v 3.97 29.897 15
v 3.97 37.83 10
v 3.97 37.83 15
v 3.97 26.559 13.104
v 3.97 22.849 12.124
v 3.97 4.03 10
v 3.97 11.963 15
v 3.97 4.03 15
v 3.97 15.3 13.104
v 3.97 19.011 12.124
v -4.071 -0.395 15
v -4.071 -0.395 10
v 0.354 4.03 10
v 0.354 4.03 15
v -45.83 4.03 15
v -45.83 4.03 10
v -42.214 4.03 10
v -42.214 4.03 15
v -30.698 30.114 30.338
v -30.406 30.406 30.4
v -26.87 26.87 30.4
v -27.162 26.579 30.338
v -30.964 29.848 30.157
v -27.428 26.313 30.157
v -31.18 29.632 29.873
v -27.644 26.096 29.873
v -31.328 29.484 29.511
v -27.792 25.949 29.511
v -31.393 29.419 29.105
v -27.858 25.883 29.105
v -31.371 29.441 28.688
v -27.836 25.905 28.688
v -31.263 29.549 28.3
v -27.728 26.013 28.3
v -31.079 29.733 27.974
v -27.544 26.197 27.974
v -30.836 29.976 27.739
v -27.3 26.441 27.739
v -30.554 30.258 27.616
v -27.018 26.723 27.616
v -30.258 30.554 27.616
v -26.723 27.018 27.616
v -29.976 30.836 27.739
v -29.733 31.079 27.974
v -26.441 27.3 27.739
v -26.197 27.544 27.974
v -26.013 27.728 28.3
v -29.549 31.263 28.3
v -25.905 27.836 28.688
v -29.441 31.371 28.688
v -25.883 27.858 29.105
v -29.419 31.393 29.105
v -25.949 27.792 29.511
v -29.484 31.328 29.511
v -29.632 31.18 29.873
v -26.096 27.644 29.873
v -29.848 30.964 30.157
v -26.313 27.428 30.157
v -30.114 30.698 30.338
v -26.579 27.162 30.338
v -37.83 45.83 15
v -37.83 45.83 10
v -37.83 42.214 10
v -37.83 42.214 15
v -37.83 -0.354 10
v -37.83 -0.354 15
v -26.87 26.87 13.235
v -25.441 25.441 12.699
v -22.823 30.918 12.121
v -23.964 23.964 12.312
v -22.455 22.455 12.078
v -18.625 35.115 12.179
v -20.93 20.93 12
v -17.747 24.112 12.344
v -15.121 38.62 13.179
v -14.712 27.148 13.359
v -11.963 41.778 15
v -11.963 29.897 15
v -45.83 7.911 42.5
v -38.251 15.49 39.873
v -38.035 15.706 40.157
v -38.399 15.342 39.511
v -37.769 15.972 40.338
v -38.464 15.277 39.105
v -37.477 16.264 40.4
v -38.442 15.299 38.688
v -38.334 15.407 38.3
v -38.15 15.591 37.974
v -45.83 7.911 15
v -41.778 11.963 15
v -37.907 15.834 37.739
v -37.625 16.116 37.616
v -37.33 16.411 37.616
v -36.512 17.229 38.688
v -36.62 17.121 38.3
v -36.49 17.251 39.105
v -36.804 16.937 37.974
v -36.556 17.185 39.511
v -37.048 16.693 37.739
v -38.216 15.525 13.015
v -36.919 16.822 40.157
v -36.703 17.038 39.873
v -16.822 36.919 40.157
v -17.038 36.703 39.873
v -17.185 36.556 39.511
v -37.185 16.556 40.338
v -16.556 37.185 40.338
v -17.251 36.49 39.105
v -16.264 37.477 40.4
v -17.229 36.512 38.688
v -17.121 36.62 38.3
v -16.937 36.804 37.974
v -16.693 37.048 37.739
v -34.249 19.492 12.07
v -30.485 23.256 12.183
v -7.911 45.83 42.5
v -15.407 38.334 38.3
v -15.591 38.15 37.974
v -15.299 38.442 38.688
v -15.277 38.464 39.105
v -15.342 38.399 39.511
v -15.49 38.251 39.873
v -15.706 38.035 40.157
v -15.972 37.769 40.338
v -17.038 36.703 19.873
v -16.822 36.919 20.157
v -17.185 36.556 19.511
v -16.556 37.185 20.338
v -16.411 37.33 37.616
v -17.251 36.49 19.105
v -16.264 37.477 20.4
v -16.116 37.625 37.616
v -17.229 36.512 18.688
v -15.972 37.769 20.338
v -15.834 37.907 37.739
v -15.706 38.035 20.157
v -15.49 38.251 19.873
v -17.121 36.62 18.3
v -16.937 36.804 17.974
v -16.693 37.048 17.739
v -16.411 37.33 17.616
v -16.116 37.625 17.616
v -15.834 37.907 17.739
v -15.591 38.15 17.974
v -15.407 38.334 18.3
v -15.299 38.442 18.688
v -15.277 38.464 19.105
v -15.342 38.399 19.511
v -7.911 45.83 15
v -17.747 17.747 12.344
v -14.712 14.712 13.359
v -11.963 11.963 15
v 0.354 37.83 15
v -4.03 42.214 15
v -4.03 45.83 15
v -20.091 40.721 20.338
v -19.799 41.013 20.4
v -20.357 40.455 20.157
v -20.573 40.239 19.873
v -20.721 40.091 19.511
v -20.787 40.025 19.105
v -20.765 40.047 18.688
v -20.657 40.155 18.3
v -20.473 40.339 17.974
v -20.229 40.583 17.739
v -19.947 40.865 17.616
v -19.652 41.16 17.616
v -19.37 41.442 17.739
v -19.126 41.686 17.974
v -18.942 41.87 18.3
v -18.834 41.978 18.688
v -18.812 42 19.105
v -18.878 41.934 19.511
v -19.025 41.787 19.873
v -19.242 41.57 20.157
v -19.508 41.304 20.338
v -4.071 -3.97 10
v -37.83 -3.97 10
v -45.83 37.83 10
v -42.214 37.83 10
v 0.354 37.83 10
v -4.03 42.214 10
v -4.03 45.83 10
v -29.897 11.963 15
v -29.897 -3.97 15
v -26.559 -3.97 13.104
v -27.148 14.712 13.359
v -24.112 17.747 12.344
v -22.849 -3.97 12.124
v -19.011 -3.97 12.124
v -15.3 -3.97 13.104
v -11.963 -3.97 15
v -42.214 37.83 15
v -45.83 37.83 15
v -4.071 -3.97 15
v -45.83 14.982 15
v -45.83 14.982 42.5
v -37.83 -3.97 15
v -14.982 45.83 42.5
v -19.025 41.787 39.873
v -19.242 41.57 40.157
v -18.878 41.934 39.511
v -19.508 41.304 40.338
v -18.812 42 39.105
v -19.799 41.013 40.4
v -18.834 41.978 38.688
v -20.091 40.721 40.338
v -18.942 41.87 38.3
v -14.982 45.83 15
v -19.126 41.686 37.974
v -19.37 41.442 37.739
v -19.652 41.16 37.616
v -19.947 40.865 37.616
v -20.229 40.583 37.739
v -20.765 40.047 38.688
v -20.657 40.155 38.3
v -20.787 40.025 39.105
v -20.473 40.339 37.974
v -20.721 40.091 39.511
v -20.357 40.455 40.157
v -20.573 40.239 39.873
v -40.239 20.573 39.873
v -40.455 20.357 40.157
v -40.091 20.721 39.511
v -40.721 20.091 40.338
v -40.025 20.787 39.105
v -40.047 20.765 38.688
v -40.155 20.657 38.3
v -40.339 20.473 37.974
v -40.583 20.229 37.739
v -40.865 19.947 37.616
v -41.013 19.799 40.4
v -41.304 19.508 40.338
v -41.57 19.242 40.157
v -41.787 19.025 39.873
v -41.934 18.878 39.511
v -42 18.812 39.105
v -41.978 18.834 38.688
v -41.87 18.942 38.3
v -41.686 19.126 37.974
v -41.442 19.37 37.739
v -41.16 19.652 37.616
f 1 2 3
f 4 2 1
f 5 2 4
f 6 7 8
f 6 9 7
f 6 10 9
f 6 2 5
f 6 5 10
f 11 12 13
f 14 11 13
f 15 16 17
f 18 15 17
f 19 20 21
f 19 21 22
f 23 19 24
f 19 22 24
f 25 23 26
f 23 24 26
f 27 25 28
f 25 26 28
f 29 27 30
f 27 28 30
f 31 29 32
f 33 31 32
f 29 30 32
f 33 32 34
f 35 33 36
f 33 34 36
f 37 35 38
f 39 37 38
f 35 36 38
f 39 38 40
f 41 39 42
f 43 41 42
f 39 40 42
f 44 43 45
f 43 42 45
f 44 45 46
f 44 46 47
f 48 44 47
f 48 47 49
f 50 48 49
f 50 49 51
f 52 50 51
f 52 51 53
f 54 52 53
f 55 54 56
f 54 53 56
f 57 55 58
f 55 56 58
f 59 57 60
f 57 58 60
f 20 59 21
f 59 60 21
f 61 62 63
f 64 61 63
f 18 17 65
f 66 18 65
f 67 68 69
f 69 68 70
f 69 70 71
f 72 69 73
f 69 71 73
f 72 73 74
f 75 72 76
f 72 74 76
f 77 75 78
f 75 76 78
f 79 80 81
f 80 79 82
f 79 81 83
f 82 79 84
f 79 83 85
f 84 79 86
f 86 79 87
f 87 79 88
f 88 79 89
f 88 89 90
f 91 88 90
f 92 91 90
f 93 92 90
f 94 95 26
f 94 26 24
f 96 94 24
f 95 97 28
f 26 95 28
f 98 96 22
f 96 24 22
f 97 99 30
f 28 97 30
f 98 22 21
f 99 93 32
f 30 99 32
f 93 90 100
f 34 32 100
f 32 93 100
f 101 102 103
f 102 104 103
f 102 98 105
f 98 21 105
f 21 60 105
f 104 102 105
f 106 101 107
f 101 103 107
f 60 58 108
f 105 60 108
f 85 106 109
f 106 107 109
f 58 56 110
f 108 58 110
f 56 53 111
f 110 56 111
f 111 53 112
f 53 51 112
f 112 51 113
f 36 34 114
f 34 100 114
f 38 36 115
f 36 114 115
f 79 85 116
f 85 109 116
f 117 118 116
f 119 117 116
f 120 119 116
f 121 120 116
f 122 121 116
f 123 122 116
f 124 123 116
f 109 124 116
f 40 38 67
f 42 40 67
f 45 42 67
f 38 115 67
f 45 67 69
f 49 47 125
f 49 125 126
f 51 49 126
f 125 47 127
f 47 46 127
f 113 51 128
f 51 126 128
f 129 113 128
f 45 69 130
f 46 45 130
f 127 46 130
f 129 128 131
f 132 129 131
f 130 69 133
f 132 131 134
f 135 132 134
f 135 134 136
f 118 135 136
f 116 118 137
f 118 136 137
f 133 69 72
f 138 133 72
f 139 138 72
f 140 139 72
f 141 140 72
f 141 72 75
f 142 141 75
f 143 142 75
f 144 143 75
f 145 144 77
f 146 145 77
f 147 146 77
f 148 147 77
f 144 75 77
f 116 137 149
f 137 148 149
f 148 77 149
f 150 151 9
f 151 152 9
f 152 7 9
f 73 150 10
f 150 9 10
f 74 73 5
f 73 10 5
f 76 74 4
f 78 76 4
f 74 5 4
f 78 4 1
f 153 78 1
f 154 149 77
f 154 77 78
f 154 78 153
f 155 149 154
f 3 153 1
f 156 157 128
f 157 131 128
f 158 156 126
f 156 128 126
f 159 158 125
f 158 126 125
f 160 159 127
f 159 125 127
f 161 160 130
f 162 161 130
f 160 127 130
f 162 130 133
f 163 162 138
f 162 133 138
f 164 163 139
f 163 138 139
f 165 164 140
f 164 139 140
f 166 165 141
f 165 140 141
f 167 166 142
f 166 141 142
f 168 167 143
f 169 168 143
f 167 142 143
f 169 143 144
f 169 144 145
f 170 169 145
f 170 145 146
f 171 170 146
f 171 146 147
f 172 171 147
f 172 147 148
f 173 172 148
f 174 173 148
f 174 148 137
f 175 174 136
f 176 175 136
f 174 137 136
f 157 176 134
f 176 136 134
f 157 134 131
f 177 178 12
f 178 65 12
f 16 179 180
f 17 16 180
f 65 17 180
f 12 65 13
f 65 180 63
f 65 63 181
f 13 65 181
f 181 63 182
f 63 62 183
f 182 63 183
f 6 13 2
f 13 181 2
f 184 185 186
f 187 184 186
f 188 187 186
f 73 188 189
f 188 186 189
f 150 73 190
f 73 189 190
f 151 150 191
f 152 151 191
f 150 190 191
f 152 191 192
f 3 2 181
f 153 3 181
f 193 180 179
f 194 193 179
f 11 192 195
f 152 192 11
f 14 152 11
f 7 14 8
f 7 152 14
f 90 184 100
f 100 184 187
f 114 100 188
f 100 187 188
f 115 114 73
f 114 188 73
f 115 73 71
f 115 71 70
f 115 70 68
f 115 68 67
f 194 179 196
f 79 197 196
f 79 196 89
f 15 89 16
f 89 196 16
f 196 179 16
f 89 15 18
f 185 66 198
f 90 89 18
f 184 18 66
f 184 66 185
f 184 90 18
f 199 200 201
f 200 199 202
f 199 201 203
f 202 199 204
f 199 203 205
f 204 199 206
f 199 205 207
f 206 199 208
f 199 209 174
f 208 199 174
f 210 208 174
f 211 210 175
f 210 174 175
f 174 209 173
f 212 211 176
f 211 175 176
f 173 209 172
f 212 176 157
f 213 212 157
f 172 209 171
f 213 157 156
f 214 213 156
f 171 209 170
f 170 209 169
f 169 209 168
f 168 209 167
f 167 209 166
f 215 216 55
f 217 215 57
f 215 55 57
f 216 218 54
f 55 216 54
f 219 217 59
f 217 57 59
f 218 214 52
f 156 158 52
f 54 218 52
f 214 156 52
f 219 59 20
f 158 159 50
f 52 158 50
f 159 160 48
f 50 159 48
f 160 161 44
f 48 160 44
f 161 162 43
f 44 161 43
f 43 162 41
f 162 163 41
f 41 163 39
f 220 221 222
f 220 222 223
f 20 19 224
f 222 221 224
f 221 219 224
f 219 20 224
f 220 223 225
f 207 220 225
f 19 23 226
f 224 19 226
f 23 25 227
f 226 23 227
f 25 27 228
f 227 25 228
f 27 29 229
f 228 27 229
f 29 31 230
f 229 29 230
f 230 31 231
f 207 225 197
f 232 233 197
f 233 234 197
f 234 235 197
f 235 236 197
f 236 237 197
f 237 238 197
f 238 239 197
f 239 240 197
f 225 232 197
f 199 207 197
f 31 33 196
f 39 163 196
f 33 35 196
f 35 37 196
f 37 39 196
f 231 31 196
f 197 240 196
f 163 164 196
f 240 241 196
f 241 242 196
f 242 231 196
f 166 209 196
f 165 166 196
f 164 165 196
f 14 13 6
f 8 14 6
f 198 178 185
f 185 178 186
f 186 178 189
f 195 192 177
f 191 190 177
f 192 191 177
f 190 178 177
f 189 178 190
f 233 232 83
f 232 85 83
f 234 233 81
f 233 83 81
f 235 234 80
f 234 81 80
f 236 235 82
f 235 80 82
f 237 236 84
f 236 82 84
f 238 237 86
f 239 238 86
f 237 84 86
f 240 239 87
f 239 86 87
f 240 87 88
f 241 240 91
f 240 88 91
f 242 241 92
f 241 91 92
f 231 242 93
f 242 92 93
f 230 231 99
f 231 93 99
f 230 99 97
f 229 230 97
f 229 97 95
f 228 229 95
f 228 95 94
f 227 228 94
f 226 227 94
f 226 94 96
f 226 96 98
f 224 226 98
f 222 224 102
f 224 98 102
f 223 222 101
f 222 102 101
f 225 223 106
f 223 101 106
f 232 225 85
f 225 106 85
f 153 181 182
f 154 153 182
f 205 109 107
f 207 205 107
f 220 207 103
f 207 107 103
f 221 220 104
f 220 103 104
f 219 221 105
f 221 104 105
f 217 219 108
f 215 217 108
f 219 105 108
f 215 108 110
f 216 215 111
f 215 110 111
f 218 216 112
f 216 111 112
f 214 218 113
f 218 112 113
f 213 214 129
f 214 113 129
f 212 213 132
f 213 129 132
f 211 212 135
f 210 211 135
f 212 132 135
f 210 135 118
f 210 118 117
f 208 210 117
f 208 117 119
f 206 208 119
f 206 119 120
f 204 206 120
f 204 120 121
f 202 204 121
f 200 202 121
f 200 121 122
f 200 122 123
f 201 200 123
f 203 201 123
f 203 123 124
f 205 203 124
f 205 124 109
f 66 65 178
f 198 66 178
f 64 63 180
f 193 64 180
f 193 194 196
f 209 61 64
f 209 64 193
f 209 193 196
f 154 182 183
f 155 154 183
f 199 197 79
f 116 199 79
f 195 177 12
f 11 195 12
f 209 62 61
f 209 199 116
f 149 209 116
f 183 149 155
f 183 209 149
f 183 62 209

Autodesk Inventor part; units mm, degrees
ref_plane "Work Plane1" through (0, 0, 10) normal (0, 0, 1) x (1, 0, 0)
sketch "Sketch1" plane through (0, 0, 10) normal (0, 0, 1) x (1, 0, 0)
  line L0 (-4.0299, -0.3538) -> (-2.2322, 1.4439) construction
  arc A0 (-1.4439, 2.2322) -> (-2.2322, 1.4439) centre (-0.9299, 0.9299) ccw construction
  line L1 (-1.4439, 2.2322) -> (0.3538, 4.0299) construction
  line L2 (-37.8299, 42.8299) -> (-37.8299, 37.8299) construction
  line L3 (-37.8299, 37.8299) -> (-42.9208, 37.8299) construction
  line L4 (-37.8299, 42.2137) -> (-37.8299, 45.8299) construction
  line L5 (-37.8299, 45.8299) -> (-4.0299, 45.8299) construction
  line L6 (-4.0299, 45.8299) -> (-4.0299, 42.2137) construction
  line L7 (-4.0299, 4.0299) -> (0.3538, 4.0299) projected
  circle A1 centre (-20.9299, 20.9299) radius 17.5 projected
  line L8 (-20.9299, 58.9723) -> (17.1124, 20.9299) construction
  line L9 (17.1124, 20.9299) -> (-20.9299, -17.1124) construction
  line L10 (-20.9299, -17.1124) -> (-58.9723, 20.9299) construction
  line L11 (-58.9723, 20.9299) -> (-20.9299, 58.9723) construction
  line L12 (-20.9299, 58.9723) -> (-20.9299, -17.1124) construction
  line L13 (17.1124, 20.9299) -> (-58.9723, 20.9299) construction
  line L14 (-20.9299, 58.9723) -> (32.8701, 58.9723) construction
  line L15 (-43.4299, 43.4299) -> (1.5701, 43.4299) construction
  line L16 (1.5701, 43.4299) -> (1.5701, -1.5701) construction
  line L17 (1.5701, -1.5701) -> (-43.4299, -1.5701) construction
  line L18 (-43.4299, -1.5701) -> (-43.4299, 43.4299) construction
  line L19 (-43.4299, 43.4299) -> (1.5701, -1.5701) construction
  line L20 (1.5701, 43.4299) -> (-43.4299, -1.5701) construction
  line L21 (-43.4299, 5.3876) -> (-43.4299, 36.4723)
  line L22 (-43.4299, 36.4723) -> (-36.4723, 43.4299)
  line L23 (-36.4723, 43.4299) -> (-5.3876, 43.4299)
  line L24 (-5.3876, 43.4299) -> (1.5701, 36.4723)
  line L25 (1.5701, 36.4723) -> (1.5701, 5.3876)
  line L26 (1.5701, 5.3876) -> (-5.3876, -1.5701)
  line L27 (-5.3876, -1.5701) -> (-36.4723, -1.5701)
  line L28 (-36.4723, -1.5701) -> (-43.4299, 5.3876)
  line L29 (-4.0299, 42.2137) -> (-37.8299, 42.2137) projected
  line L30 (-4.0299, -0.3538) -> (-4.0299, 4.0299) projected
  circle A2 centre (-20.9299, 20.9299) radius 1.4
  line L31 (-10.9299, 10.9299) -> (-30.9299, 10.9299) construction
  line L32 (-30.9299, 10.9299) -> (-30.9299, 30.9299) construction
  line L33 (-30.9299, 30.9299) -> (-10.9299, 30.9299) construction
  line L34 (-10.9299, 30.9299) -> (-10.9299, 10.9299) construction
  line L35 (-10.9299, 10.9299) -> (-30.9299, 30.9299) construction
  line L36 (-30.9299, 10.9299) -> (-10.9299, 30.9299) construction
  circle A3 centre (-30.9299, 30.9299) radius 1.4
  circle A4 centre (-30.9299, 10.9299) radius 1.4
  circle A5 centre (-10.9299, 10.9299) radius 1.4
  line L37 (-45.8299, 37.8299) -> (-42.0723, 37.8299) construction
  line L38 (-42.1723, 37.7299) -> (-45.8299, 37.7299)
  line L39 (-45.8299, 37.7299) -> (-45.8299, 4.1299)
  line L40 (-45.8299, 4.1299) -> (-42.1723, 4.1299)
  line L41 (-42.1723, 4.1299) -> (-42.1723, 37.7299)
  line L42 (-45.8299, 4.0299) -> (-42.0723, 4.0299) construction
  line L43 (-45.8299, 37.8299) -> (-42.0723, 37.8299) projected
  line L44 (-37.7299, 45.8299) -> (-4.1299, 45.8299)
  line L45 (-4.1299, 45.8299) -> (-4.1299, 42.1723)
  line L46 (-4.1299, 42.1723) -> (-37.7299, 42.1723)
  line L47 (-37.7299, 42.1723) -> (-37.7299, 45.8299)
  line L48 (0.4701, 37.8299) -> (0.4701, 4.0299) construction
  line L49 (0.4701, 4.0299) -> (3.9701, 4.0299) construction
  line L50 (3.9701, 37.8299) -> (3.9701, 4.0299) construction
  line L51 (0.4701, 37.8299) -> (3.9701, 37.8299) construction
  line L52 (-45.8299, -3.9701) -> (-4.0299, -3.9701) construction
  line L53 (0.3124, 37.7299) -> (3.9701, 37.7299)
  line L54 (3.9701, 37.7299) -> (3.9701, 4.1299)
  line L55 (3.9701, 4.1299) -> (0.3124, 4.1299)
  line L56 (0.3124, 4.1299) -> (0.3124, 37.7299)
  line L57 (-4.1713, -0.3538) -> (-37.7299, -0.3538)
  line L58 (-37.7299, -0.3538) -> (-37.7299, -3.9701)
  line L59 (-37.7299, -3.9701) -> (-4.1713, -3.9701)
  line L60 (-4.1713, -3.9701) -> (-4.1713, -0.3538)
  point P0 (-37.8299, 4.0299)
  dimension "d18" = 53.8
  dimension "d19" = 45
  dimension "d20" = 53.8
  dimension "d21" = 45
  dimension "d22" = 45
  dimension "d30" = 20
  dimension "d31" = 20
  dimension "d32" = 2.8
  dimension "d33" = 2.8
  dimension "d34" = 2.8
  dimension "d35" = 2.8
  dimension "d36" = 0.1
  dimension "d37" = 0.1
  dimension "d38" = 0.1
  dimension "d39" = 0.1
extrude "Extrusion1" add sketch "Sketch1" along normal blind 5 contours L30 L26 L57 L28 L41 L22 L46 L24 L56 L7 | L7 L26 L30 | L56 L24 L25 L26 | L26 L25 L24 L53 L54 L55 | L60 L59 L58 L57 L28 L27 L26 | L26 L27 L28 L57 | L46 L22 L29 L24 | L24 L29 L45 | L40 L39 L38 L22 L21 L28 | L28 L21 L22 L41 | L29 L22 L23 L24 | L24 L23 L22 L29 L47 L44 L45 | L47 L29 L22 | A1 | A2 | A3 | A4 | A5
sketch "Sketch4" plane through (0, 0, 15) normal (0, 0, 1) x (1, 0, 0)
  line L0 (-37.7299, 42.1723) -> (-42.1723, 37.7299) projected
  line L1 (-42.1723, 37.7299) -> (-45.8299, 37.7299) projected
  line L2 (-45.8299, 37.7299) -> (-45.8299, 4.1299) projected
  line L3 (-45.8299, 4.1299) -> (-42.1723, 4.1299) projected
  line L4 (-42.1723, 4.1299) -> (-37.6885, -0.3538) projected
  line L5 (-37.6885, -0.3538) -> (-37.7299, -0.3538) projected
  line L6 (-37.7299, -0.3538) -> (-37.7299, -3.9701) projected
  line L7 (-37.7299, -3.9701) -> (-4.1713, -3.9701) projected
  line L8 (-4.1713, -3.9701) -> (-4.1713, -0.3538) projected
  line L9 (-4.1713, -0.3538) -> (0.3124, 4.1299) projected
  line L10 (0.3124, 4.1299) -> (3.9701, 4.1299) projected
  line L11 (3.9701, 4.1299) -> (3.9701, 37.7299) projected
  line L12 (3.9701, 37.7299) -> (0.3124, 37.7299) projected
  line L13 (0.3124, 37.7299) -> (-4.1299, 42.1723) projected
  line L14 (-4.1299, 42.1723) -> (-4.1299, 45.8299) projected
  line L15 (-4.1299, 45.8299) -> (-37.7299, 45.8299) projected
  line L16 (-37.7299, 45.8299) -> (-37.7299, 42.1723) projected
  line L17 (-45.8299, 37.7299) -> (-45.8299, 4.1299) projected
  line L18 (-45.8299, 7.911) -> (-7.911, 45.8299)
  line L19 (-45.8299, 7.911) -> (7.7955, 7.911) construction
  line L20 (-7.911, 45.8299) -> (-14.9821, 45.8299)
  line L21 (-4.1299, 45.8299) -> (-37.7299, 45.8299) projected
  line L22 (-14.9821, 45.8299) -> (-45.8299, 14.9821)
  line L23 (-45.8299, 7.911) -> (-45.8299, 14.9821)
  circle A0 centre (-40.9299, 0.9299) radius 1.1933 projected
  circle A1 centre (-0.9299, 40.9299) radius 1.4 projected
  line L24 (-40.9299, 0.9299) -> (-0.9299, 40.9299)
  line L25 (0.3124, 37.7299) -> (-4.1299, 42.1723) projected
  point P0 (0, 0)
  dimension "d40" = 45
  dimension "d41" = 5
extrude "Extrusion4" add sketch "Sketch4" along normal blind 27.5 contours L15 L18 L2 L22
sketch "Sketch5" plane through (-45.8299, 14.9821, 15) normal (-0.7071068, 0.7071068, 0) x (-0.7071068, -0.7071068, 0)
  line L0 (0, 0) -> (-43.6254, 0) projected
  line L1 (0, 0) -> (0, 27.5) projected
  line L2 (-43.6254, 27.5) -> (0, 27.5) projected
  line L3 (-43.6254, 0) -> (-43.6254, 27.5) projected
  circle A0 centre (-21.8127, 5.6873) radius 21.8127
  line L4 (-6.8127, 24) -> (-36.8127, 24) construction
  line L5 (-36.8127, 24) -> (-36.8127, 4) construction
  line L6 (-36.8127, 4) -> (-6.8127, 4) construction
  line L7 (-6.8127, 4) -> (-6.8127, 24) construction
  line L8 (-6.8127, 24) -> (-36.8127, 4) construction
  line L9 (-36.8127, 24) -> (-6.8127, 4) construction
  point P0 (-21.8127, -15)
  point P1 (-21.8127, 14)
  dimension "d44" = 30
  dimension "d45" = 20
hole "Hole1" at (-19.7994, 41.0126, 39) at (-19.7994, 41.0126, 19) at (-41.0126, 19.7994, 39) at (-30.406, 30.406, 29) direction (0.7071068, -0.7071068, 0) diameter 2.8 depth 12
sketch "Sketch6" plane through (-37.7299, -3.9701, 10) normal (0, -1, 0) x (1, 0, 0)
  circle A0 centre (-3.2, 36.9) radius 1.45 projected
  circle A1 centre (36.8, 36.9) radius 1.45 projected
  line L0 (-6.1, 0) -> (-6.1, 39.8) projected
  line L1 (-0.1, 0) -> (-6.1, 0) projected
  line L2 (-0.1, 33.8) -> (-0.1, 0) projected
  line L3 (33.7, 33.8) -> (-0.1, 33.8) projected
  line L4 (33.7, 33.8) -> (33.7, 0) projected
  line L5 (39.7, 0) -> (33.7, 0) projected
  line L6 (39.7, 39.8) -> (39.7, 0) projected
  line L7 (-6.1, 39.8) -> (39.7, 39.8) projected
  circle A2 centre (16.8, 16.9) radius 16.9
  circle A3 centre (16.8, 16.9) radius 14.9
  line L8 (-0.1, 16.9) -> (-0.1, 0)
  line L9 (0, 0) -> (33.5586, 0) projected
  line L10 (0.0414, 0) -> (-4.4423, 0) projected
  line L11 (33.5586, 0) -> (0.0414, 0)
  line L12 (33.7, 16.9) -> (33.5586, 0)
  point P0 (37.7299, -10)
  dimension "d53" = 2
extrude "Extrusion5" cut sketch "Sketch6" against normal up to surface contours A3 surface through (-45.8299, 7.911, 15) normal (0.7071068, -0.7071068, 0)
ref_plane "Work Plane3" through (3.9701, 45.8299, 26) normal (1, 0, 0) x (0, -1, 0)
sketch "Sketch7" plane through (3.9701, 45.8299, 26) normal (1, 0, 0) x (0, -1, 0)
  line L0 (41.8, -17.8) -> (41.8, 16)
  line L1 (8, -17.8) -> (41.8, -17.8)
  line L2 (8, -17.8) -> (8, 16)
  circle A0 centre (24.9, -0.9) radius 16.9
  circle A1 centre (24.9, -0.9) radius 14.9
  point P0 (45.8299, 26)
  dimension "d56" = 2
ref_plane "Work Plane4" through (-34.8055, 8.3289, 16.6138) normal (0.7071068, -0.7071068, 0) x (0.7071068, 0.7071068, 0)
extrude "Extrusion6" cut sketch "Sketch7" against normal up to surface contours A1 surface through (-45.8299, 7.911, 15) normal (0.7071068, -0.7071068, 0)
sketch "Skizze8" plane through (0, 0, 10) normal (0, 0, -1) x (-1, 0, 0)
  line L0 (42.1723, 37.7299) -> (37.7299, 42.1723) projected
  line L1 (37.7299, 45.8299) -> (37.7299, 42.1723) projected
  line L2 (4.1299, 45.8299) -> (37.7299, 45.8299) construction
  line L3 (4.1299, 42.1723) -> (4.1299, 45.8299) projected
  line L4 (4.1299, 42.1723) -> (-0.3124, 37.7299) projected
  line L5 (-3.9701, 37.7299) -> (-0.3124, 37.7299) projected
  line L6 (-3.9701, 4.1299) -> (-3.9701, 37.7299) construction
  line L7 (-0.3124, 4.1299) -> (-3.9701, 4.1299) projected
  line L8 (-0.3124, 4.1299) -> (4.1713, -0.3538) projected
  line L9 (4.1713, -3.9701) -> (4.1713, -0.3538) projected
  line L10 (37.7299, -3.9701) -> (4.1713, -3.9701) construction
  line L11 (37.7299, -0.3538) -> (37.7299, -3.9701) projected
  line L12 (37.6885, -0.3538) -> (37.7299, -0.3538) projected
  line L13 (37.6885, -0.3538) -> (42.1723, 4.1299) projected
  line L14 (45.8299, 4.1299) -> (42.1723, 4.1299) projected
  line L15 (45.8299, 37.7299) -> (45.8299, 4.1299) construction
  line L16 (42.1723, 37.7299) -> (45.8299, 37.7299) projected
  line L17 (45.9299, 4.0299) -> (42.2137, 4.0299)
  line L18 (42.2137, 4.0299) -> (37.8299, -0.3538)
  line L19 (37.8299, -0.3538) -> (37.8299, -4.0701)
  line L20 (37.8299, -4.0701) -> (4.0713, -4.0701) construction
  line L21 (4.0713, -4.0701) -> (4.0713, -0.3953)
  line L22 (4.0713, -0.3953) -> (-0.3538, 4.0299)
  line L23 (-0.3538, 4.0299) -> (-4.0701, 4.0299)
  line L24 (-4.0701, 4.0299) -> (-4.0701, 37.8299) construction
  line L25 (-4.0701, 37.8299) -> (-0.3538, 37.8299)
  line L26 (-0.3538, 37.8299) -> (4.0299, 42.2137)
  line L27 (4.0299, 42.2137) -> (4.0299, 45.9299)
  line L28 (4.0299, 45.9299) -> (37.8299, 45.9299) construction
  line L29 (37.8299, 45.9299) -> (37.8299, 42.2137)
  line L30 (37.8299, 42.2137) -> (42.2137, 37.8299)
  line L31 (42.2137, 37.8299) -> (45.9299, 37.8299)
  line L32 (45.9299, 37.8299) -> (45.9299, 4.0299) construction
  line L33 (37.7299, 45.8299) -> (37.7299, 42.1723) projected
  line L34 (37.7299, 45.8299) -> (37.8299, 45.8299)
  line L35 (42.1723, 37.7299) -> (45.8299, 37.7299) projected
  line L36 (45.8299, 37.7299) -> (45.8299, 37.8299)
  line L37 (45.8299, 4.1299) -> (45.8299, 4.0299)
  line L38 (37.7299, -3.9701) -> (4.1713, -3.9701) projected
  line L39 (37.7299, -3.9701) -> (37.8299, -3.9701)
  line L40 (4.1713, -3.9701) -> (4.0713, -3.9701)
  line L41 (-3.9701, 4.1299) -> (-3.9701, 4.0299)
  line L42 (-3.9701, 37.7299) -> (-0.3124, 37.7299) projected
  line L43 (-3.9701, 37.7299) -> (-3.9701, 37.8299)
  line L44 (4.1299, 42.1723) -> (4.1299, 45.8299) projected
  line L45 (4.1299, 45.8299) -> (4.0299, 45.8299)
  point P0 (0, 0)
  dimension "d59" = 0.1
extrude "IM_offset" add sketch "Skizze8" against normal up to surface (5 mm away)
properties part number "20_Cube_Insert_Kinematic_Mirrormount_45_base_v3_aaa"
